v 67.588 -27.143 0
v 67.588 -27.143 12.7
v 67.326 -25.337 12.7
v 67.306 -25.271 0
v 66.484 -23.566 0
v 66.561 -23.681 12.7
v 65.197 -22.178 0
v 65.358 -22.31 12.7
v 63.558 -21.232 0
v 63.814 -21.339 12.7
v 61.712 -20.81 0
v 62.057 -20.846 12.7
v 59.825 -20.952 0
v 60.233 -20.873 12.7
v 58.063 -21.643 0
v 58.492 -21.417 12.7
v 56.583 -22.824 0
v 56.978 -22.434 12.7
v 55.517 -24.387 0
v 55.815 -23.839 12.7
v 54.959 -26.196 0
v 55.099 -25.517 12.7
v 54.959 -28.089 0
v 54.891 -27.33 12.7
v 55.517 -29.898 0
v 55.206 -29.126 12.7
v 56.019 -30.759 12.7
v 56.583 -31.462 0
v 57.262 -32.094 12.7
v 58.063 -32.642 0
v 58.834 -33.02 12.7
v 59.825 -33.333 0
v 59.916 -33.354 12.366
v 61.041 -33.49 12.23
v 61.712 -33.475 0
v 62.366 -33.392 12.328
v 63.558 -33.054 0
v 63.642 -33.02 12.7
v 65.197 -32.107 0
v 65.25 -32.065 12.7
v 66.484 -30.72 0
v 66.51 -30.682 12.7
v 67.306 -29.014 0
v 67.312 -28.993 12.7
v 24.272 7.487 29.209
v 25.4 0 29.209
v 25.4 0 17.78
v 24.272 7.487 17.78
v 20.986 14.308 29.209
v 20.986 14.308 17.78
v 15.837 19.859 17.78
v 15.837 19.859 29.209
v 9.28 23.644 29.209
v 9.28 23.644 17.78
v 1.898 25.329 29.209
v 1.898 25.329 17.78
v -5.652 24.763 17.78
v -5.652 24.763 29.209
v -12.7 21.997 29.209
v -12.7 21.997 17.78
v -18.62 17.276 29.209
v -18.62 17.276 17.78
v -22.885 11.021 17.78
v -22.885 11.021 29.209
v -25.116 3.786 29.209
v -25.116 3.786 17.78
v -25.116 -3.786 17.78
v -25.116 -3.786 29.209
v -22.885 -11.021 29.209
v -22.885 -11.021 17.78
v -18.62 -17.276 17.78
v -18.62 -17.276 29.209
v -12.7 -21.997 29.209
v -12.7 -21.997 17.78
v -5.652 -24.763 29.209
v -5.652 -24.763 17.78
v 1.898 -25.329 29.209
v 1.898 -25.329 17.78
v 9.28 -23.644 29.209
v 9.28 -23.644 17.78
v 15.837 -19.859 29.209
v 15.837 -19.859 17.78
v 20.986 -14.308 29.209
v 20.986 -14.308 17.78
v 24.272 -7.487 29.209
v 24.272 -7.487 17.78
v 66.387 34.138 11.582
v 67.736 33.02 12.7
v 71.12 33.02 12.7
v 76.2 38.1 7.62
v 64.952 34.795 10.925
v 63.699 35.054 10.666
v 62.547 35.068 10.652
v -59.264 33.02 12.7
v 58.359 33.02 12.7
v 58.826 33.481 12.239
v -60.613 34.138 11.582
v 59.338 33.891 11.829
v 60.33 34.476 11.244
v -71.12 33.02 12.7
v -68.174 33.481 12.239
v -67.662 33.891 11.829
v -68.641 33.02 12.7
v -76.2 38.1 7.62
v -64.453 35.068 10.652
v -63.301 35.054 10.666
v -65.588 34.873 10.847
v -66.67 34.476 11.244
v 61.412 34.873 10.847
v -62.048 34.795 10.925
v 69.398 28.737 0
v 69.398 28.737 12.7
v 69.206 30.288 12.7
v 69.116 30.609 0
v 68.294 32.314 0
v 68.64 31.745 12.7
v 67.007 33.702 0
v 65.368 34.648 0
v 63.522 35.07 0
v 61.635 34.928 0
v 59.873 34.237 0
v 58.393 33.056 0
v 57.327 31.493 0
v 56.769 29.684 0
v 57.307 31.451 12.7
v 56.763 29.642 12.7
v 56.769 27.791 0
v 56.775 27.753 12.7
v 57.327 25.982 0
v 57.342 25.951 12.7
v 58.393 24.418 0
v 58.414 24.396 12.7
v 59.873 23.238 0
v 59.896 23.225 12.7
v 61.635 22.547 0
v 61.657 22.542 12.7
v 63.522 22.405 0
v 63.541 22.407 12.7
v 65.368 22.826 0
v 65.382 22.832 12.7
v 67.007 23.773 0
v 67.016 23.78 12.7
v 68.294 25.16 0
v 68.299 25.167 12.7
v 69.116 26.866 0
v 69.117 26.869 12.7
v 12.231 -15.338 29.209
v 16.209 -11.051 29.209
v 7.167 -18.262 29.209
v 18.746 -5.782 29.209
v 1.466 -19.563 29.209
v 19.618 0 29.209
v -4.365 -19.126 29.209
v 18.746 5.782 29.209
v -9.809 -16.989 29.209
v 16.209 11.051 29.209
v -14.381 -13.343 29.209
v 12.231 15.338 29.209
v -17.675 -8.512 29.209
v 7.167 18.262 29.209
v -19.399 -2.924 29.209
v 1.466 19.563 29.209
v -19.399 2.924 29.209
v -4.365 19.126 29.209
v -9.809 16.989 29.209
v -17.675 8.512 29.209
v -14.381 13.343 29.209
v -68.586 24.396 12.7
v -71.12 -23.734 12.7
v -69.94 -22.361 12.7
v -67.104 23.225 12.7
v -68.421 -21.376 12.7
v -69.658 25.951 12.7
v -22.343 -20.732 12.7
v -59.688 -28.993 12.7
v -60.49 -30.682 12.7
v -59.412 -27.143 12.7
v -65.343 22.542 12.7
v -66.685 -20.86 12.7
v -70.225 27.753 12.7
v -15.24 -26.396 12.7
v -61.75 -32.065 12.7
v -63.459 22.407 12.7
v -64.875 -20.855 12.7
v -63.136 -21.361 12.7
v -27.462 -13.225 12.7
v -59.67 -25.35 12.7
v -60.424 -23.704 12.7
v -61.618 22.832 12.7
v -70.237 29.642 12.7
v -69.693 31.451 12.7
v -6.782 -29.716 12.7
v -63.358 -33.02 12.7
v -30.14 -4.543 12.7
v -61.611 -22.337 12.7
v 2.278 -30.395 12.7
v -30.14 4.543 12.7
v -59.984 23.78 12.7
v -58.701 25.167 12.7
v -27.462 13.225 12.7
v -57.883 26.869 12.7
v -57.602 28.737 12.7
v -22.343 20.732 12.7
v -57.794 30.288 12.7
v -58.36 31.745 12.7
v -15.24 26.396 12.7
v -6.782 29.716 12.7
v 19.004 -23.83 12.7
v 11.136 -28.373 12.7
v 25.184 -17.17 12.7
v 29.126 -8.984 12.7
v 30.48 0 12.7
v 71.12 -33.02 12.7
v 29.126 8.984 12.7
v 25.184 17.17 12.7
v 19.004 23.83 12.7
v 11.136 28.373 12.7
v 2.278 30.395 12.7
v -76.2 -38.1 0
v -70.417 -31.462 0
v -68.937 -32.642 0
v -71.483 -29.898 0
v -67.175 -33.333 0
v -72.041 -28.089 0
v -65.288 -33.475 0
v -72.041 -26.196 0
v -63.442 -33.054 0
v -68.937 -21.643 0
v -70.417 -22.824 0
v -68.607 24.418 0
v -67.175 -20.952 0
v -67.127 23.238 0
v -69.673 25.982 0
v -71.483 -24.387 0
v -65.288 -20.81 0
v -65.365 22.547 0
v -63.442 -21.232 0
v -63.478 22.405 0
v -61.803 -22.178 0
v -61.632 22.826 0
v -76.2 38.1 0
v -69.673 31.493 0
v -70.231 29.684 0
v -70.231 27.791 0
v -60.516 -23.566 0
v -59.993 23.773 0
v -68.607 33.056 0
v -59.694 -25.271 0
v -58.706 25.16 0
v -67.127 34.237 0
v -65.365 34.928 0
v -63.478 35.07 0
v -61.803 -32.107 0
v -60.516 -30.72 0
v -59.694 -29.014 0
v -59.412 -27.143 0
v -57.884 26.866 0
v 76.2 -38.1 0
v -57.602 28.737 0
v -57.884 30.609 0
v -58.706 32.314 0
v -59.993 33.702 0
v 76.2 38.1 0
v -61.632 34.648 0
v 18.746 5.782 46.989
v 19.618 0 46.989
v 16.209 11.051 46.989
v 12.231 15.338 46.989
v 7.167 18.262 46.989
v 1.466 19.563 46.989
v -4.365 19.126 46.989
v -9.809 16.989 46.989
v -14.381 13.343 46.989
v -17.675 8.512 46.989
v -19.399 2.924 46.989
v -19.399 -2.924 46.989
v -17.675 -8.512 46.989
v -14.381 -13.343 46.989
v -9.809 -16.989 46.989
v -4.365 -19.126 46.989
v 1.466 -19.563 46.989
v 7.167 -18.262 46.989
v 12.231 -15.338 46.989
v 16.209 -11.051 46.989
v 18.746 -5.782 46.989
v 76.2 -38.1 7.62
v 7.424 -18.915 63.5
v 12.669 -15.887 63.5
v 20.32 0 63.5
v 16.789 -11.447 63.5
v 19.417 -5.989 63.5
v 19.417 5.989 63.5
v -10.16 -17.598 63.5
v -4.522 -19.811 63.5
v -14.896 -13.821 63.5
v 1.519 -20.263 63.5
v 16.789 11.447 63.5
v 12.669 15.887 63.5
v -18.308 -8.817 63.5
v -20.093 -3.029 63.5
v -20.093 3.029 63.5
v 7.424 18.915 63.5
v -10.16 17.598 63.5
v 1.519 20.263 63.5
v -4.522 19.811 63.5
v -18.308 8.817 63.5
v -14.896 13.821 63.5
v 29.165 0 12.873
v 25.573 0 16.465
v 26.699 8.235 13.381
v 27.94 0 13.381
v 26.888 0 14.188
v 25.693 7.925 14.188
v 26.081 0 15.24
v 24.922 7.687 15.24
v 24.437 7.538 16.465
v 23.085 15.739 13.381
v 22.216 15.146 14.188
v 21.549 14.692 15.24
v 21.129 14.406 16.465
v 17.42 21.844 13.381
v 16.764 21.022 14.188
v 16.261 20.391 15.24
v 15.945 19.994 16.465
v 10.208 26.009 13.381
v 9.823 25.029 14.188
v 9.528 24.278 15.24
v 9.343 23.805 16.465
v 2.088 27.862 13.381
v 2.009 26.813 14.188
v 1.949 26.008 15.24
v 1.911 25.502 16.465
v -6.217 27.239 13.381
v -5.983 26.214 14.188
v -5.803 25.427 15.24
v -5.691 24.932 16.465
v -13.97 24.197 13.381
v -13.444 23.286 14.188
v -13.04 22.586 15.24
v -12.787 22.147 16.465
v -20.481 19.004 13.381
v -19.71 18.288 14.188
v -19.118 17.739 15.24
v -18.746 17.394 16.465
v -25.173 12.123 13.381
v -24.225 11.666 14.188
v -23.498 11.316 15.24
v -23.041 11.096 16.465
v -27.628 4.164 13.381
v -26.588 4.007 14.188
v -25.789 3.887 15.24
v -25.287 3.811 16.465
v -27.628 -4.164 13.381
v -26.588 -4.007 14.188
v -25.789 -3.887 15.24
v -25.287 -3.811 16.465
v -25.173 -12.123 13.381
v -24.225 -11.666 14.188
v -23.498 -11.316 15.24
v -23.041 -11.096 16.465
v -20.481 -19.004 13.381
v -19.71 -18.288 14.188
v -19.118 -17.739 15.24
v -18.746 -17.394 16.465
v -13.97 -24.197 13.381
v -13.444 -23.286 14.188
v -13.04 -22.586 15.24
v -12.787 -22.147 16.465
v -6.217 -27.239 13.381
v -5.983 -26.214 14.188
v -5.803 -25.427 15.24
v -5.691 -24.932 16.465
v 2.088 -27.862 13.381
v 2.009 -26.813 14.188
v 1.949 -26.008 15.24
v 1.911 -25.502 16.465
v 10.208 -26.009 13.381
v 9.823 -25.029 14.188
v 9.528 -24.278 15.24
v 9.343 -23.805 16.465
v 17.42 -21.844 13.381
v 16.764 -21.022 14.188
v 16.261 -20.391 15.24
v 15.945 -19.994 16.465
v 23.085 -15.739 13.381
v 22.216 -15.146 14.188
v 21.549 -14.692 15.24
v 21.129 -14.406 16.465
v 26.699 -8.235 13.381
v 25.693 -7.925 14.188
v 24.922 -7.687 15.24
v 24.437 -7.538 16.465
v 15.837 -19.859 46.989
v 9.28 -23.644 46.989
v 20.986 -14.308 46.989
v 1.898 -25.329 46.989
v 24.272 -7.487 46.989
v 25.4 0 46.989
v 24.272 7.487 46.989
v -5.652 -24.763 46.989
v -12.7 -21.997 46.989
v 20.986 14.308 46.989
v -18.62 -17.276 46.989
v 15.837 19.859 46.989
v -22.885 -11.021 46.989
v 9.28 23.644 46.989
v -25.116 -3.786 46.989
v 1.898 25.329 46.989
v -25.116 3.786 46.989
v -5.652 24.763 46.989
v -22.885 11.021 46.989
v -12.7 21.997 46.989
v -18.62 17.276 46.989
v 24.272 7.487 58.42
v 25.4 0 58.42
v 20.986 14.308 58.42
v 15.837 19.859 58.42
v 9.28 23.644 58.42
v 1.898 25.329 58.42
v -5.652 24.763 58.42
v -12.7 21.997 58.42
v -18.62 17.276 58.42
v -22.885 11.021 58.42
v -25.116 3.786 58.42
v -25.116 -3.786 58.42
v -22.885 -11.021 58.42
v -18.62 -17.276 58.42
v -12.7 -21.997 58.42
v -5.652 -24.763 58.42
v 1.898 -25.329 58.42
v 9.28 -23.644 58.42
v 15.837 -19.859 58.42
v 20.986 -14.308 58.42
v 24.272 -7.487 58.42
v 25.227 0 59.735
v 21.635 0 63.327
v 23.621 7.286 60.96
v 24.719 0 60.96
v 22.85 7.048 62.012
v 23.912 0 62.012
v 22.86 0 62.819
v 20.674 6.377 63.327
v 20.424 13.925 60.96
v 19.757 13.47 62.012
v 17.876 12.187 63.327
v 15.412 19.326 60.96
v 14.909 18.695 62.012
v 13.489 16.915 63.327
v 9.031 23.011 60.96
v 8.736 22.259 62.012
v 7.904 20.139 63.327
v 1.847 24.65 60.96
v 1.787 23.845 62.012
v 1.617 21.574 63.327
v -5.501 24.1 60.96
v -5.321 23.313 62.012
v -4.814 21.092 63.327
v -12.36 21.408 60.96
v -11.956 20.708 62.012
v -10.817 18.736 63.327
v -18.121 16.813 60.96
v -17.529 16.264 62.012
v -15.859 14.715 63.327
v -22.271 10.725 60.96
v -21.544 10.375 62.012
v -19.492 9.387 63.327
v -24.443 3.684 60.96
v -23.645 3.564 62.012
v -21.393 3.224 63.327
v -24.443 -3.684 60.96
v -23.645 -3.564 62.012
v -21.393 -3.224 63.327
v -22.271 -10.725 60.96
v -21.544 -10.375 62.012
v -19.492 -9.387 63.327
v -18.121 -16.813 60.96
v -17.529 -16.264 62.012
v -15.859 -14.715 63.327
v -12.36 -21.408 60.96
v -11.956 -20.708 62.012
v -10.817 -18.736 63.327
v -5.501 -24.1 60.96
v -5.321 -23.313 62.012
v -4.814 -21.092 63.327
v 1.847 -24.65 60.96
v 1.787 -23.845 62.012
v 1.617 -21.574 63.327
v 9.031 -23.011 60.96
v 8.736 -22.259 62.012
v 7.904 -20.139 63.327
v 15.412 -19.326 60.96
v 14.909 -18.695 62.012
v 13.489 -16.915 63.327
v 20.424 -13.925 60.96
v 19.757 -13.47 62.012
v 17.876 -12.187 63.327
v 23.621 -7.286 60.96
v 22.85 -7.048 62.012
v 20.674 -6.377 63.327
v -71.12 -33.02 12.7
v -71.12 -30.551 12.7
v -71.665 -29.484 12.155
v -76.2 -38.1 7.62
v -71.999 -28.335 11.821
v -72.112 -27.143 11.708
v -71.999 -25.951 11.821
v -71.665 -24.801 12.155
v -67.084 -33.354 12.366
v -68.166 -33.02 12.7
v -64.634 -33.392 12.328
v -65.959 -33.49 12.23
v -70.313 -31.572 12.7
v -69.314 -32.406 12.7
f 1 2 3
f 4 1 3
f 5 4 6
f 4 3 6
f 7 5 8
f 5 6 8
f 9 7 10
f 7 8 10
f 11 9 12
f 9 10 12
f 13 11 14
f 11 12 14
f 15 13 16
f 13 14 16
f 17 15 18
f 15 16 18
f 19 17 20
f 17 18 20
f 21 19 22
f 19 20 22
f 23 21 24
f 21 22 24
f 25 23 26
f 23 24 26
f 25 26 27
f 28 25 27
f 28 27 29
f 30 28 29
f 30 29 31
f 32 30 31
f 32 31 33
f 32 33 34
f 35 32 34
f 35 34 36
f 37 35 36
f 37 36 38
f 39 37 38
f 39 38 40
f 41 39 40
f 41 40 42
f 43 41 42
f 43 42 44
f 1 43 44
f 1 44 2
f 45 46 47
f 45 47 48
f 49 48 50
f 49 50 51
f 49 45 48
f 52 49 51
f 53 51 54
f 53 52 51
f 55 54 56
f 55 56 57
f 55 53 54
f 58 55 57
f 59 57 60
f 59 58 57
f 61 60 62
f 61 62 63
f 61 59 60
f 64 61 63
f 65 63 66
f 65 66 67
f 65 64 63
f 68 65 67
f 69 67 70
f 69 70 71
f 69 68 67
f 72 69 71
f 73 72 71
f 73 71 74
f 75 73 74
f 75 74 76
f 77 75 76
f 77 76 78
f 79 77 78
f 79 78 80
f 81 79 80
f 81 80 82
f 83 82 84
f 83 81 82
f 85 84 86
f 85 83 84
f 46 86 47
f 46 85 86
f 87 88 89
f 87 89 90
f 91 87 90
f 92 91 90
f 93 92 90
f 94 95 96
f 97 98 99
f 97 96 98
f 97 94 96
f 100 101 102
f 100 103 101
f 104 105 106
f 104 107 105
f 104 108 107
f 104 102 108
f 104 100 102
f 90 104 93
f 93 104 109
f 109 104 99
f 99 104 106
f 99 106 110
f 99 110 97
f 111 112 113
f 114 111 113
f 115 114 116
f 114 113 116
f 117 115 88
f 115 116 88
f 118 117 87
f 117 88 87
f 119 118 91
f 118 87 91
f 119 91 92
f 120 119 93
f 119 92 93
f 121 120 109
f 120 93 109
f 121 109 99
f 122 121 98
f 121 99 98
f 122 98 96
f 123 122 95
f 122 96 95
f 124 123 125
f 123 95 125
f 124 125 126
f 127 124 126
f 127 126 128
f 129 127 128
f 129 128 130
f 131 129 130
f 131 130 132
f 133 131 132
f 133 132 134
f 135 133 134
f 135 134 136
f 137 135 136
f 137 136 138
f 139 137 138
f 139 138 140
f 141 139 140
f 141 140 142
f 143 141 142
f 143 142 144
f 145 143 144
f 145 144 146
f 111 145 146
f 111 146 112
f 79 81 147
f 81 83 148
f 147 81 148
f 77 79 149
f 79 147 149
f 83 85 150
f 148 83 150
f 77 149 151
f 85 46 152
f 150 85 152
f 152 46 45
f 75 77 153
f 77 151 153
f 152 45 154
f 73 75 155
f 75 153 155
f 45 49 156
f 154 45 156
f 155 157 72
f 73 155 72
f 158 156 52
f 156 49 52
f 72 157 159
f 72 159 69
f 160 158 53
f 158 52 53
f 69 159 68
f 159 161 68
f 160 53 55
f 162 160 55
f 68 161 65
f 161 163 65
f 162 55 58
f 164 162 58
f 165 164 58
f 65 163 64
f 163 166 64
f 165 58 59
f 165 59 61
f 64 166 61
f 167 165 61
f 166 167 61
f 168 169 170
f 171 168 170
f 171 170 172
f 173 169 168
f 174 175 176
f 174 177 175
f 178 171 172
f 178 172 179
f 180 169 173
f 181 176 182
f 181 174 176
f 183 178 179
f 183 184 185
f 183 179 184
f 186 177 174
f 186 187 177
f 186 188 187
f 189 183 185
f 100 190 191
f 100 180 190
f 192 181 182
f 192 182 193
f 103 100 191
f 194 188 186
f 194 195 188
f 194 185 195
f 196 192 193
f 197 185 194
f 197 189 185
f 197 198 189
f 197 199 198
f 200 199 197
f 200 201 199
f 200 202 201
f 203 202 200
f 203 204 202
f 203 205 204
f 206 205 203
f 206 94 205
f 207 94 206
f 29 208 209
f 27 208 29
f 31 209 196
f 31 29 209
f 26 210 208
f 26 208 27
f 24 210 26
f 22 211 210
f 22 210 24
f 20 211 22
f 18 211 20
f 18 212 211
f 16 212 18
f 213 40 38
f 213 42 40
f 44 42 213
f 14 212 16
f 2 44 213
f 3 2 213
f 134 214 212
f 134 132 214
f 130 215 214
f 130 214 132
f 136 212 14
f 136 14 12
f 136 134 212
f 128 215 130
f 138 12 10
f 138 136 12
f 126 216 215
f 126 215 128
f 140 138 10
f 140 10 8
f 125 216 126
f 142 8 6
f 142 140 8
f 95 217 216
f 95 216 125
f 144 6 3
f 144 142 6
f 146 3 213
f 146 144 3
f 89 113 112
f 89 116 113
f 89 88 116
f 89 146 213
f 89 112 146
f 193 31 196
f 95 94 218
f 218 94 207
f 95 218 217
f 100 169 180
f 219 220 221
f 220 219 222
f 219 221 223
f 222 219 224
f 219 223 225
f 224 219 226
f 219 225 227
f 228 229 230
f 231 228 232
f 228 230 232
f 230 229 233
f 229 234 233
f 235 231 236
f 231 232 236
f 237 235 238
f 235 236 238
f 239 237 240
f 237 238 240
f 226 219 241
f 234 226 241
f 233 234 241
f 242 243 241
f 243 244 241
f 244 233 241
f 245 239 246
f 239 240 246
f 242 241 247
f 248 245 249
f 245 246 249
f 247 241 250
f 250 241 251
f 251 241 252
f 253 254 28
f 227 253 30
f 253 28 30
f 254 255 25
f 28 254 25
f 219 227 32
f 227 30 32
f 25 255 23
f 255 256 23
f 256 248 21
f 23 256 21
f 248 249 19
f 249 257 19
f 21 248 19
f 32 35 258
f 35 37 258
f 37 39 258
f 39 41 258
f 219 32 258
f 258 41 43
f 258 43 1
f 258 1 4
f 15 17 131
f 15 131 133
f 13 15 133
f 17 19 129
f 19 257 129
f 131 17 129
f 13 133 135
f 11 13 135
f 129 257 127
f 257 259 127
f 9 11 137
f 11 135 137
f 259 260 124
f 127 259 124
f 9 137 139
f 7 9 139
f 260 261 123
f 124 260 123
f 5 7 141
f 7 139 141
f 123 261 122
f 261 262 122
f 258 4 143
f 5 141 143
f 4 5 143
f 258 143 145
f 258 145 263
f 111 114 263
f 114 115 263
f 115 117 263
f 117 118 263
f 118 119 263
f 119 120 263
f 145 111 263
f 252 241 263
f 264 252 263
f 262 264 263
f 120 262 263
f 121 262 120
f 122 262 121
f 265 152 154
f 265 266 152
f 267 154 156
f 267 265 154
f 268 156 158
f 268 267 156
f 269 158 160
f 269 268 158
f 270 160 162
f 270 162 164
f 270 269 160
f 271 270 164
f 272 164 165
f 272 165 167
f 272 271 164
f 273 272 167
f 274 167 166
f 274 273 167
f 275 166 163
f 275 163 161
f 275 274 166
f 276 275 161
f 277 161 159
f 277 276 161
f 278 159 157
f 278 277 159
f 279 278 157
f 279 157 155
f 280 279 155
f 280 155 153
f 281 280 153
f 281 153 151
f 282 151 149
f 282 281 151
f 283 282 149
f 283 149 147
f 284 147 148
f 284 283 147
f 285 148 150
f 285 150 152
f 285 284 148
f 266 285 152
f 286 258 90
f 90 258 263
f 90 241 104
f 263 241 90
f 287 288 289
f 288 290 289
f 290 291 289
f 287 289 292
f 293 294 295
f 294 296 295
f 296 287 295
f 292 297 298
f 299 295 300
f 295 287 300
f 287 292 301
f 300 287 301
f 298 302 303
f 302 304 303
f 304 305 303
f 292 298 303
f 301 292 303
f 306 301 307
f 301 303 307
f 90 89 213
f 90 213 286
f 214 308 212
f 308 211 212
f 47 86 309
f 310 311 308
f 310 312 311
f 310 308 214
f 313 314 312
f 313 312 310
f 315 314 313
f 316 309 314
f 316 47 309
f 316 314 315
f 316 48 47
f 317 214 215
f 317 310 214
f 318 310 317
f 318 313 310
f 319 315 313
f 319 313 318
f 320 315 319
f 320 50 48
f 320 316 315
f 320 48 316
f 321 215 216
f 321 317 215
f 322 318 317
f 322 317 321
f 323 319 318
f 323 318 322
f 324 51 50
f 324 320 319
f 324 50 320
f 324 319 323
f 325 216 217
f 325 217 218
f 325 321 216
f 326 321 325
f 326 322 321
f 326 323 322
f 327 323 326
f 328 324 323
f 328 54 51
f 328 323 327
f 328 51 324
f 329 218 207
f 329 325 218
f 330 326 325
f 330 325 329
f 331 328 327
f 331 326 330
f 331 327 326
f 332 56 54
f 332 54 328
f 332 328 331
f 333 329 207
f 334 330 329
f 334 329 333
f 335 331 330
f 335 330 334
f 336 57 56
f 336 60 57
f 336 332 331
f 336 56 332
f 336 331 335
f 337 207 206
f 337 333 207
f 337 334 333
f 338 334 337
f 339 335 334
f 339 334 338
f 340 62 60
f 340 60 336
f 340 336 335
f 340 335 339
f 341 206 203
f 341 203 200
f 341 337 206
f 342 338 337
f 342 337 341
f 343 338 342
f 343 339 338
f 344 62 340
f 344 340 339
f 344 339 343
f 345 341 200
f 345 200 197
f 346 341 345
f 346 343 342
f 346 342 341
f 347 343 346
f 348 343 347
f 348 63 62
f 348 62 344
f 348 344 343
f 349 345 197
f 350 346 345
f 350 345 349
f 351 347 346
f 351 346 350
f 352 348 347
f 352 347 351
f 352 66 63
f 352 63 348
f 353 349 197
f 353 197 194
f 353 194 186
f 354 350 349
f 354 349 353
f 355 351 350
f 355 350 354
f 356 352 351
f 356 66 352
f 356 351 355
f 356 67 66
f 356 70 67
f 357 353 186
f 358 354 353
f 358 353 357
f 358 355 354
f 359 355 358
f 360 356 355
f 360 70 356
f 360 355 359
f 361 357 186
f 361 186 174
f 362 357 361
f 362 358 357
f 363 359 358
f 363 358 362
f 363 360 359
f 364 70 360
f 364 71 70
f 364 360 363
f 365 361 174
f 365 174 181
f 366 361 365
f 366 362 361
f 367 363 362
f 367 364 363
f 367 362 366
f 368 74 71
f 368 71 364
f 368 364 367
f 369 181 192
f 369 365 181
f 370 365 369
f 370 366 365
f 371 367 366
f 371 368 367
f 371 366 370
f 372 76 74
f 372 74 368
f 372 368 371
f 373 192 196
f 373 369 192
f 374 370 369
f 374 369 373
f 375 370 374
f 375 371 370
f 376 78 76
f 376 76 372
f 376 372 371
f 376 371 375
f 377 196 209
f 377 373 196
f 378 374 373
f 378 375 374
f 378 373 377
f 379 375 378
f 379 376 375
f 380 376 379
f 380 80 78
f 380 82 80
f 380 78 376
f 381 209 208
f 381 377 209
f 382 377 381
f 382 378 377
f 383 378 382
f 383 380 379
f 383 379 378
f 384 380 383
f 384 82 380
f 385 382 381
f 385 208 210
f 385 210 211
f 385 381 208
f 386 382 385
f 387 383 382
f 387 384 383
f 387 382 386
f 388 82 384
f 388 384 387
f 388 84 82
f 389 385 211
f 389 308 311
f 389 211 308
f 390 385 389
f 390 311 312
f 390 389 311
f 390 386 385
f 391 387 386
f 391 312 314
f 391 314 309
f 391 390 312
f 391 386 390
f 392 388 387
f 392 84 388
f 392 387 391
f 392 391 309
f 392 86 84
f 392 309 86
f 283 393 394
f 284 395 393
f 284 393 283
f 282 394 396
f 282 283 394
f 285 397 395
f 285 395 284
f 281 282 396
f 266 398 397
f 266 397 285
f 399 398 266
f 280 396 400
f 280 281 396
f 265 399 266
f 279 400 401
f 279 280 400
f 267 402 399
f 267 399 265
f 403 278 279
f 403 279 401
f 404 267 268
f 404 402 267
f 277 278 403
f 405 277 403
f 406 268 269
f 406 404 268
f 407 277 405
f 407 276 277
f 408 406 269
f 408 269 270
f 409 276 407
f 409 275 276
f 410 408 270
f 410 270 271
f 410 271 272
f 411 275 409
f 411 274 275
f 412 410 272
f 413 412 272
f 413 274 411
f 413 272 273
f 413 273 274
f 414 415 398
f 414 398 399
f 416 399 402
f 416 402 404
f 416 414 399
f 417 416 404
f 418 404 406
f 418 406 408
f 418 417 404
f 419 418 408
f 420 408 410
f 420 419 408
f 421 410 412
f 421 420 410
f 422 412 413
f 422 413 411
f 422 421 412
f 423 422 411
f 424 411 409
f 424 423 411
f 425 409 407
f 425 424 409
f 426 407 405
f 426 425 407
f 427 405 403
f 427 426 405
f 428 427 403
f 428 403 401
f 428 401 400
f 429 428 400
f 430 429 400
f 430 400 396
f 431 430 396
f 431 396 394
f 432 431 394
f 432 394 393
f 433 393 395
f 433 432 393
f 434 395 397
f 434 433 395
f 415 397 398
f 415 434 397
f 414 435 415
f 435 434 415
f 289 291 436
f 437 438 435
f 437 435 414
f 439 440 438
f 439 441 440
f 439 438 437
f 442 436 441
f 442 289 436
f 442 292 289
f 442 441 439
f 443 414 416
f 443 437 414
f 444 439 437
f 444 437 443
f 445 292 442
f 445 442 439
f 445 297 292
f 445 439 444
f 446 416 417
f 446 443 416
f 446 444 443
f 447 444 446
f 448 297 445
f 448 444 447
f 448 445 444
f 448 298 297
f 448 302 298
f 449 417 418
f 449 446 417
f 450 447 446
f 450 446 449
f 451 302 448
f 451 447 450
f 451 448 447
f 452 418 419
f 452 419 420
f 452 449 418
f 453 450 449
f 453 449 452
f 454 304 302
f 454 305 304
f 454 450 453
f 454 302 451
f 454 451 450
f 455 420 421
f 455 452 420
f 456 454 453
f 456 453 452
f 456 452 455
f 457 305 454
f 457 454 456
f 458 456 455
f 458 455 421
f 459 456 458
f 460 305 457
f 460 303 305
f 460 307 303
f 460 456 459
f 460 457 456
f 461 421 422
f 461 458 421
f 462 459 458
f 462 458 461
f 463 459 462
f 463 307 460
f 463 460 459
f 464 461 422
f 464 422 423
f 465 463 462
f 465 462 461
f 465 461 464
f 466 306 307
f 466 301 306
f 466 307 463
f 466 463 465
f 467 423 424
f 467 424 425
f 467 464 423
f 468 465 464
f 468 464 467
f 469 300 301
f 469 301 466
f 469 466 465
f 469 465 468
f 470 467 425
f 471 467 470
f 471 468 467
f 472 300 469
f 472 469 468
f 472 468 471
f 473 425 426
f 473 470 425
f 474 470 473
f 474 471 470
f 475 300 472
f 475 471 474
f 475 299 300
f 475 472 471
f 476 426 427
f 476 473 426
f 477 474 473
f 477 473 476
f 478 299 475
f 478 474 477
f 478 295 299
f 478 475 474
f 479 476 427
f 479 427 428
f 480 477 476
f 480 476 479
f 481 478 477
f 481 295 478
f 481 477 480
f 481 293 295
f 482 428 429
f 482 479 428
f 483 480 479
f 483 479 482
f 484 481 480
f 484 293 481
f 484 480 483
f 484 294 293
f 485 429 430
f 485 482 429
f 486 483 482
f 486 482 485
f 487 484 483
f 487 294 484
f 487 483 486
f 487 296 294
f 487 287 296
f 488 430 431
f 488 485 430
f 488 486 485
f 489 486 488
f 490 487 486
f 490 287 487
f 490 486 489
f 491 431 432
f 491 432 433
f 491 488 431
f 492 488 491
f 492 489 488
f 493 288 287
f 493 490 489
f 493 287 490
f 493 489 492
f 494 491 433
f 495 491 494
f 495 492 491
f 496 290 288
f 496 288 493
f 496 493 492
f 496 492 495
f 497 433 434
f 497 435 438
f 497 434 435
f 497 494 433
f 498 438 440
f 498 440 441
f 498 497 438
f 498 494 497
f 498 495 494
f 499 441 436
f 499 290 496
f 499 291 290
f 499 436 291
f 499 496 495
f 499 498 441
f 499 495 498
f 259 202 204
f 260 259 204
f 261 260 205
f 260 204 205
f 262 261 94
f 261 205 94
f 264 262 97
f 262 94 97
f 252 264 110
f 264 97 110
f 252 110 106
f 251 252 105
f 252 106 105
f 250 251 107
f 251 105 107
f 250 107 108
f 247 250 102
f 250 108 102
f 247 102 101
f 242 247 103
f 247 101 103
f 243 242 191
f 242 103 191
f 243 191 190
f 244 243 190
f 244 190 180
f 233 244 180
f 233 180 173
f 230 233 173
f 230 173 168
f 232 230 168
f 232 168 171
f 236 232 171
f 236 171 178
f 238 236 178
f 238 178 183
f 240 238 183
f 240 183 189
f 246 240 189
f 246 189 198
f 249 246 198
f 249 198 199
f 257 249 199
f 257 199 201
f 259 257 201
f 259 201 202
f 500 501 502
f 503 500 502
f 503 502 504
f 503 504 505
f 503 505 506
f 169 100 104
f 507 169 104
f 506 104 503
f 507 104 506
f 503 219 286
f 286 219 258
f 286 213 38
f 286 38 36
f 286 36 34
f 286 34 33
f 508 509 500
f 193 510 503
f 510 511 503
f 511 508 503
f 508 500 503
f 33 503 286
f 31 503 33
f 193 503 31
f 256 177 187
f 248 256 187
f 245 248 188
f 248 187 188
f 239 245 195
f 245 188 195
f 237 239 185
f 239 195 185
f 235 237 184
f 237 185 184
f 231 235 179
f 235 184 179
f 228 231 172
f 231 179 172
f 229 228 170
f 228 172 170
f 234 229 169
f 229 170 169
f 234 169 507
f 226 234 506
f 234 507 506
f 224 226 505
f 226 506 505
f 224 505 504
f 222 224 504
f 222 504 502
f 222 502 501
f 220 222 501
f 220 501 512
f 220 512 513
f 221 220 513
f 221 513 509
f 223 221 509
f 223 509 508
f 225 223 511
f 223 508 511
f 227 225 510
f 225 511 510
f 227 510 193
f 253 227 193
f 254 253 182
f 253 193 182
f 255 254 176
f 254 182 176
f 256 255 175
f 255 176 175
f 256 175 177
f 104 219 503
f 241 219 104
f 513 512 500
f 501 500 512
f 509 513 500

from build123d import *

# Parameters (mm, degrees)
F0_W        = 152.4
F0_H        = 76.2
F1_DEPTH    = 12.7
F2_R        = 6.35
F3_DEPTH    = 12.701
F4_W        = 25.4
F4_H        = 50.8
F6_W        = 11.3594501876
F6_H        = 17.78
F8_R        = 5.08
F9_T1_DEPTH = 102.3282991577
F9_T3_DEPTH = 178.5282991577


# Not quite as in the source:
# - a fillet or chamfer that OpenCascade refuses, or shapes differently, is made with other operations: its cross-section is extruded or revolved along the edge and cut away or added


with BuildPart() as f1:
    # F0 (on Top) → F1 (new body)
    with BuildSketch(Plane.XY):
        Rectangle(F0_W, F0_H)
    extrude(amount=F1_DEPTH)

    # F2 (on face) → F3 (cut, through all)
    with BuildSketch(Plane.XY.offset(12.7)):
        with Locations((-63.9521719884, 28.7373781539)):
            Circle(F2_R)
        with Locations((-65.762154874, -27.1426218461)):
            Circle(F2_R)
        with Locations((63.0478280116, 28.7373781539)):
            Circle(F2_R)
        with Locations((61.237845126, -27.1426218461)):
            Circle(F2_R)
    extrude(amount=-F3_DEPTH, mode=Mode.SUBTRACT)

    # F4 (on Front) → F5 (revolve)
    with BuildSketch(Plane.XZ):
        with Locations((12.7, 38.1)):
            Rectangle(F4_W, F4_H)
    revolve(axis=Axis((0, 0, 38.1), (0, 0, 1)))

    # F6 (on Front) → F7 (revolve, cut)
    with BuildSketch(Plane.XZ):
        with Locations((25.2974471077, 38.0985615775)):
            Rectangle(F6_W, F6_H)
    revolve(axis=Axis((0, 0, 12.7), (0, 0, 1)), mode=Mode.SUBTRACT)

    # F8
    f8_edges = [f1.edges().sort_by_distance(p)[0] for p in [
        (-25.4, 0, 63.5),
        (-25.4, 0, 12.7),
    ]]
    fillet(f8_edges, radius=F8_R)

    # F9: chamfer of 5.08 on 4 edges, made by hand

    # F9_s2 → F9_t1 (cut)
    with BuildSketch(Plane.XZ.offset(-51.1641495789)):
        Polygon((71.12, 12.7), (76.2, 7.62), (76.2, 12.7), align=None)
        Polygon((-71.12, 12.7), (-76.2, 7.62), (-76.2, 12.7), align=None)
    extrude(amount=F9_T1_DEPTH, mode=Mode.SUBTRACT)

    # F9_s4 → F9_t3 (cut)
    with BuildSketch(Plane.YZ.offset(-89.2641495789)):
        Polygon((33.02, 12.7), (38.1, 7.62), (38.1, 12.7), align=None)
        Polygon((-33.02, 12.7), (-38.1, 7.62), (-38.1, 12.7), align=None)
    extrude(amount=F9_T3_DEPTH, mode=Mode.SUBTRACT)


solid = f1.part
